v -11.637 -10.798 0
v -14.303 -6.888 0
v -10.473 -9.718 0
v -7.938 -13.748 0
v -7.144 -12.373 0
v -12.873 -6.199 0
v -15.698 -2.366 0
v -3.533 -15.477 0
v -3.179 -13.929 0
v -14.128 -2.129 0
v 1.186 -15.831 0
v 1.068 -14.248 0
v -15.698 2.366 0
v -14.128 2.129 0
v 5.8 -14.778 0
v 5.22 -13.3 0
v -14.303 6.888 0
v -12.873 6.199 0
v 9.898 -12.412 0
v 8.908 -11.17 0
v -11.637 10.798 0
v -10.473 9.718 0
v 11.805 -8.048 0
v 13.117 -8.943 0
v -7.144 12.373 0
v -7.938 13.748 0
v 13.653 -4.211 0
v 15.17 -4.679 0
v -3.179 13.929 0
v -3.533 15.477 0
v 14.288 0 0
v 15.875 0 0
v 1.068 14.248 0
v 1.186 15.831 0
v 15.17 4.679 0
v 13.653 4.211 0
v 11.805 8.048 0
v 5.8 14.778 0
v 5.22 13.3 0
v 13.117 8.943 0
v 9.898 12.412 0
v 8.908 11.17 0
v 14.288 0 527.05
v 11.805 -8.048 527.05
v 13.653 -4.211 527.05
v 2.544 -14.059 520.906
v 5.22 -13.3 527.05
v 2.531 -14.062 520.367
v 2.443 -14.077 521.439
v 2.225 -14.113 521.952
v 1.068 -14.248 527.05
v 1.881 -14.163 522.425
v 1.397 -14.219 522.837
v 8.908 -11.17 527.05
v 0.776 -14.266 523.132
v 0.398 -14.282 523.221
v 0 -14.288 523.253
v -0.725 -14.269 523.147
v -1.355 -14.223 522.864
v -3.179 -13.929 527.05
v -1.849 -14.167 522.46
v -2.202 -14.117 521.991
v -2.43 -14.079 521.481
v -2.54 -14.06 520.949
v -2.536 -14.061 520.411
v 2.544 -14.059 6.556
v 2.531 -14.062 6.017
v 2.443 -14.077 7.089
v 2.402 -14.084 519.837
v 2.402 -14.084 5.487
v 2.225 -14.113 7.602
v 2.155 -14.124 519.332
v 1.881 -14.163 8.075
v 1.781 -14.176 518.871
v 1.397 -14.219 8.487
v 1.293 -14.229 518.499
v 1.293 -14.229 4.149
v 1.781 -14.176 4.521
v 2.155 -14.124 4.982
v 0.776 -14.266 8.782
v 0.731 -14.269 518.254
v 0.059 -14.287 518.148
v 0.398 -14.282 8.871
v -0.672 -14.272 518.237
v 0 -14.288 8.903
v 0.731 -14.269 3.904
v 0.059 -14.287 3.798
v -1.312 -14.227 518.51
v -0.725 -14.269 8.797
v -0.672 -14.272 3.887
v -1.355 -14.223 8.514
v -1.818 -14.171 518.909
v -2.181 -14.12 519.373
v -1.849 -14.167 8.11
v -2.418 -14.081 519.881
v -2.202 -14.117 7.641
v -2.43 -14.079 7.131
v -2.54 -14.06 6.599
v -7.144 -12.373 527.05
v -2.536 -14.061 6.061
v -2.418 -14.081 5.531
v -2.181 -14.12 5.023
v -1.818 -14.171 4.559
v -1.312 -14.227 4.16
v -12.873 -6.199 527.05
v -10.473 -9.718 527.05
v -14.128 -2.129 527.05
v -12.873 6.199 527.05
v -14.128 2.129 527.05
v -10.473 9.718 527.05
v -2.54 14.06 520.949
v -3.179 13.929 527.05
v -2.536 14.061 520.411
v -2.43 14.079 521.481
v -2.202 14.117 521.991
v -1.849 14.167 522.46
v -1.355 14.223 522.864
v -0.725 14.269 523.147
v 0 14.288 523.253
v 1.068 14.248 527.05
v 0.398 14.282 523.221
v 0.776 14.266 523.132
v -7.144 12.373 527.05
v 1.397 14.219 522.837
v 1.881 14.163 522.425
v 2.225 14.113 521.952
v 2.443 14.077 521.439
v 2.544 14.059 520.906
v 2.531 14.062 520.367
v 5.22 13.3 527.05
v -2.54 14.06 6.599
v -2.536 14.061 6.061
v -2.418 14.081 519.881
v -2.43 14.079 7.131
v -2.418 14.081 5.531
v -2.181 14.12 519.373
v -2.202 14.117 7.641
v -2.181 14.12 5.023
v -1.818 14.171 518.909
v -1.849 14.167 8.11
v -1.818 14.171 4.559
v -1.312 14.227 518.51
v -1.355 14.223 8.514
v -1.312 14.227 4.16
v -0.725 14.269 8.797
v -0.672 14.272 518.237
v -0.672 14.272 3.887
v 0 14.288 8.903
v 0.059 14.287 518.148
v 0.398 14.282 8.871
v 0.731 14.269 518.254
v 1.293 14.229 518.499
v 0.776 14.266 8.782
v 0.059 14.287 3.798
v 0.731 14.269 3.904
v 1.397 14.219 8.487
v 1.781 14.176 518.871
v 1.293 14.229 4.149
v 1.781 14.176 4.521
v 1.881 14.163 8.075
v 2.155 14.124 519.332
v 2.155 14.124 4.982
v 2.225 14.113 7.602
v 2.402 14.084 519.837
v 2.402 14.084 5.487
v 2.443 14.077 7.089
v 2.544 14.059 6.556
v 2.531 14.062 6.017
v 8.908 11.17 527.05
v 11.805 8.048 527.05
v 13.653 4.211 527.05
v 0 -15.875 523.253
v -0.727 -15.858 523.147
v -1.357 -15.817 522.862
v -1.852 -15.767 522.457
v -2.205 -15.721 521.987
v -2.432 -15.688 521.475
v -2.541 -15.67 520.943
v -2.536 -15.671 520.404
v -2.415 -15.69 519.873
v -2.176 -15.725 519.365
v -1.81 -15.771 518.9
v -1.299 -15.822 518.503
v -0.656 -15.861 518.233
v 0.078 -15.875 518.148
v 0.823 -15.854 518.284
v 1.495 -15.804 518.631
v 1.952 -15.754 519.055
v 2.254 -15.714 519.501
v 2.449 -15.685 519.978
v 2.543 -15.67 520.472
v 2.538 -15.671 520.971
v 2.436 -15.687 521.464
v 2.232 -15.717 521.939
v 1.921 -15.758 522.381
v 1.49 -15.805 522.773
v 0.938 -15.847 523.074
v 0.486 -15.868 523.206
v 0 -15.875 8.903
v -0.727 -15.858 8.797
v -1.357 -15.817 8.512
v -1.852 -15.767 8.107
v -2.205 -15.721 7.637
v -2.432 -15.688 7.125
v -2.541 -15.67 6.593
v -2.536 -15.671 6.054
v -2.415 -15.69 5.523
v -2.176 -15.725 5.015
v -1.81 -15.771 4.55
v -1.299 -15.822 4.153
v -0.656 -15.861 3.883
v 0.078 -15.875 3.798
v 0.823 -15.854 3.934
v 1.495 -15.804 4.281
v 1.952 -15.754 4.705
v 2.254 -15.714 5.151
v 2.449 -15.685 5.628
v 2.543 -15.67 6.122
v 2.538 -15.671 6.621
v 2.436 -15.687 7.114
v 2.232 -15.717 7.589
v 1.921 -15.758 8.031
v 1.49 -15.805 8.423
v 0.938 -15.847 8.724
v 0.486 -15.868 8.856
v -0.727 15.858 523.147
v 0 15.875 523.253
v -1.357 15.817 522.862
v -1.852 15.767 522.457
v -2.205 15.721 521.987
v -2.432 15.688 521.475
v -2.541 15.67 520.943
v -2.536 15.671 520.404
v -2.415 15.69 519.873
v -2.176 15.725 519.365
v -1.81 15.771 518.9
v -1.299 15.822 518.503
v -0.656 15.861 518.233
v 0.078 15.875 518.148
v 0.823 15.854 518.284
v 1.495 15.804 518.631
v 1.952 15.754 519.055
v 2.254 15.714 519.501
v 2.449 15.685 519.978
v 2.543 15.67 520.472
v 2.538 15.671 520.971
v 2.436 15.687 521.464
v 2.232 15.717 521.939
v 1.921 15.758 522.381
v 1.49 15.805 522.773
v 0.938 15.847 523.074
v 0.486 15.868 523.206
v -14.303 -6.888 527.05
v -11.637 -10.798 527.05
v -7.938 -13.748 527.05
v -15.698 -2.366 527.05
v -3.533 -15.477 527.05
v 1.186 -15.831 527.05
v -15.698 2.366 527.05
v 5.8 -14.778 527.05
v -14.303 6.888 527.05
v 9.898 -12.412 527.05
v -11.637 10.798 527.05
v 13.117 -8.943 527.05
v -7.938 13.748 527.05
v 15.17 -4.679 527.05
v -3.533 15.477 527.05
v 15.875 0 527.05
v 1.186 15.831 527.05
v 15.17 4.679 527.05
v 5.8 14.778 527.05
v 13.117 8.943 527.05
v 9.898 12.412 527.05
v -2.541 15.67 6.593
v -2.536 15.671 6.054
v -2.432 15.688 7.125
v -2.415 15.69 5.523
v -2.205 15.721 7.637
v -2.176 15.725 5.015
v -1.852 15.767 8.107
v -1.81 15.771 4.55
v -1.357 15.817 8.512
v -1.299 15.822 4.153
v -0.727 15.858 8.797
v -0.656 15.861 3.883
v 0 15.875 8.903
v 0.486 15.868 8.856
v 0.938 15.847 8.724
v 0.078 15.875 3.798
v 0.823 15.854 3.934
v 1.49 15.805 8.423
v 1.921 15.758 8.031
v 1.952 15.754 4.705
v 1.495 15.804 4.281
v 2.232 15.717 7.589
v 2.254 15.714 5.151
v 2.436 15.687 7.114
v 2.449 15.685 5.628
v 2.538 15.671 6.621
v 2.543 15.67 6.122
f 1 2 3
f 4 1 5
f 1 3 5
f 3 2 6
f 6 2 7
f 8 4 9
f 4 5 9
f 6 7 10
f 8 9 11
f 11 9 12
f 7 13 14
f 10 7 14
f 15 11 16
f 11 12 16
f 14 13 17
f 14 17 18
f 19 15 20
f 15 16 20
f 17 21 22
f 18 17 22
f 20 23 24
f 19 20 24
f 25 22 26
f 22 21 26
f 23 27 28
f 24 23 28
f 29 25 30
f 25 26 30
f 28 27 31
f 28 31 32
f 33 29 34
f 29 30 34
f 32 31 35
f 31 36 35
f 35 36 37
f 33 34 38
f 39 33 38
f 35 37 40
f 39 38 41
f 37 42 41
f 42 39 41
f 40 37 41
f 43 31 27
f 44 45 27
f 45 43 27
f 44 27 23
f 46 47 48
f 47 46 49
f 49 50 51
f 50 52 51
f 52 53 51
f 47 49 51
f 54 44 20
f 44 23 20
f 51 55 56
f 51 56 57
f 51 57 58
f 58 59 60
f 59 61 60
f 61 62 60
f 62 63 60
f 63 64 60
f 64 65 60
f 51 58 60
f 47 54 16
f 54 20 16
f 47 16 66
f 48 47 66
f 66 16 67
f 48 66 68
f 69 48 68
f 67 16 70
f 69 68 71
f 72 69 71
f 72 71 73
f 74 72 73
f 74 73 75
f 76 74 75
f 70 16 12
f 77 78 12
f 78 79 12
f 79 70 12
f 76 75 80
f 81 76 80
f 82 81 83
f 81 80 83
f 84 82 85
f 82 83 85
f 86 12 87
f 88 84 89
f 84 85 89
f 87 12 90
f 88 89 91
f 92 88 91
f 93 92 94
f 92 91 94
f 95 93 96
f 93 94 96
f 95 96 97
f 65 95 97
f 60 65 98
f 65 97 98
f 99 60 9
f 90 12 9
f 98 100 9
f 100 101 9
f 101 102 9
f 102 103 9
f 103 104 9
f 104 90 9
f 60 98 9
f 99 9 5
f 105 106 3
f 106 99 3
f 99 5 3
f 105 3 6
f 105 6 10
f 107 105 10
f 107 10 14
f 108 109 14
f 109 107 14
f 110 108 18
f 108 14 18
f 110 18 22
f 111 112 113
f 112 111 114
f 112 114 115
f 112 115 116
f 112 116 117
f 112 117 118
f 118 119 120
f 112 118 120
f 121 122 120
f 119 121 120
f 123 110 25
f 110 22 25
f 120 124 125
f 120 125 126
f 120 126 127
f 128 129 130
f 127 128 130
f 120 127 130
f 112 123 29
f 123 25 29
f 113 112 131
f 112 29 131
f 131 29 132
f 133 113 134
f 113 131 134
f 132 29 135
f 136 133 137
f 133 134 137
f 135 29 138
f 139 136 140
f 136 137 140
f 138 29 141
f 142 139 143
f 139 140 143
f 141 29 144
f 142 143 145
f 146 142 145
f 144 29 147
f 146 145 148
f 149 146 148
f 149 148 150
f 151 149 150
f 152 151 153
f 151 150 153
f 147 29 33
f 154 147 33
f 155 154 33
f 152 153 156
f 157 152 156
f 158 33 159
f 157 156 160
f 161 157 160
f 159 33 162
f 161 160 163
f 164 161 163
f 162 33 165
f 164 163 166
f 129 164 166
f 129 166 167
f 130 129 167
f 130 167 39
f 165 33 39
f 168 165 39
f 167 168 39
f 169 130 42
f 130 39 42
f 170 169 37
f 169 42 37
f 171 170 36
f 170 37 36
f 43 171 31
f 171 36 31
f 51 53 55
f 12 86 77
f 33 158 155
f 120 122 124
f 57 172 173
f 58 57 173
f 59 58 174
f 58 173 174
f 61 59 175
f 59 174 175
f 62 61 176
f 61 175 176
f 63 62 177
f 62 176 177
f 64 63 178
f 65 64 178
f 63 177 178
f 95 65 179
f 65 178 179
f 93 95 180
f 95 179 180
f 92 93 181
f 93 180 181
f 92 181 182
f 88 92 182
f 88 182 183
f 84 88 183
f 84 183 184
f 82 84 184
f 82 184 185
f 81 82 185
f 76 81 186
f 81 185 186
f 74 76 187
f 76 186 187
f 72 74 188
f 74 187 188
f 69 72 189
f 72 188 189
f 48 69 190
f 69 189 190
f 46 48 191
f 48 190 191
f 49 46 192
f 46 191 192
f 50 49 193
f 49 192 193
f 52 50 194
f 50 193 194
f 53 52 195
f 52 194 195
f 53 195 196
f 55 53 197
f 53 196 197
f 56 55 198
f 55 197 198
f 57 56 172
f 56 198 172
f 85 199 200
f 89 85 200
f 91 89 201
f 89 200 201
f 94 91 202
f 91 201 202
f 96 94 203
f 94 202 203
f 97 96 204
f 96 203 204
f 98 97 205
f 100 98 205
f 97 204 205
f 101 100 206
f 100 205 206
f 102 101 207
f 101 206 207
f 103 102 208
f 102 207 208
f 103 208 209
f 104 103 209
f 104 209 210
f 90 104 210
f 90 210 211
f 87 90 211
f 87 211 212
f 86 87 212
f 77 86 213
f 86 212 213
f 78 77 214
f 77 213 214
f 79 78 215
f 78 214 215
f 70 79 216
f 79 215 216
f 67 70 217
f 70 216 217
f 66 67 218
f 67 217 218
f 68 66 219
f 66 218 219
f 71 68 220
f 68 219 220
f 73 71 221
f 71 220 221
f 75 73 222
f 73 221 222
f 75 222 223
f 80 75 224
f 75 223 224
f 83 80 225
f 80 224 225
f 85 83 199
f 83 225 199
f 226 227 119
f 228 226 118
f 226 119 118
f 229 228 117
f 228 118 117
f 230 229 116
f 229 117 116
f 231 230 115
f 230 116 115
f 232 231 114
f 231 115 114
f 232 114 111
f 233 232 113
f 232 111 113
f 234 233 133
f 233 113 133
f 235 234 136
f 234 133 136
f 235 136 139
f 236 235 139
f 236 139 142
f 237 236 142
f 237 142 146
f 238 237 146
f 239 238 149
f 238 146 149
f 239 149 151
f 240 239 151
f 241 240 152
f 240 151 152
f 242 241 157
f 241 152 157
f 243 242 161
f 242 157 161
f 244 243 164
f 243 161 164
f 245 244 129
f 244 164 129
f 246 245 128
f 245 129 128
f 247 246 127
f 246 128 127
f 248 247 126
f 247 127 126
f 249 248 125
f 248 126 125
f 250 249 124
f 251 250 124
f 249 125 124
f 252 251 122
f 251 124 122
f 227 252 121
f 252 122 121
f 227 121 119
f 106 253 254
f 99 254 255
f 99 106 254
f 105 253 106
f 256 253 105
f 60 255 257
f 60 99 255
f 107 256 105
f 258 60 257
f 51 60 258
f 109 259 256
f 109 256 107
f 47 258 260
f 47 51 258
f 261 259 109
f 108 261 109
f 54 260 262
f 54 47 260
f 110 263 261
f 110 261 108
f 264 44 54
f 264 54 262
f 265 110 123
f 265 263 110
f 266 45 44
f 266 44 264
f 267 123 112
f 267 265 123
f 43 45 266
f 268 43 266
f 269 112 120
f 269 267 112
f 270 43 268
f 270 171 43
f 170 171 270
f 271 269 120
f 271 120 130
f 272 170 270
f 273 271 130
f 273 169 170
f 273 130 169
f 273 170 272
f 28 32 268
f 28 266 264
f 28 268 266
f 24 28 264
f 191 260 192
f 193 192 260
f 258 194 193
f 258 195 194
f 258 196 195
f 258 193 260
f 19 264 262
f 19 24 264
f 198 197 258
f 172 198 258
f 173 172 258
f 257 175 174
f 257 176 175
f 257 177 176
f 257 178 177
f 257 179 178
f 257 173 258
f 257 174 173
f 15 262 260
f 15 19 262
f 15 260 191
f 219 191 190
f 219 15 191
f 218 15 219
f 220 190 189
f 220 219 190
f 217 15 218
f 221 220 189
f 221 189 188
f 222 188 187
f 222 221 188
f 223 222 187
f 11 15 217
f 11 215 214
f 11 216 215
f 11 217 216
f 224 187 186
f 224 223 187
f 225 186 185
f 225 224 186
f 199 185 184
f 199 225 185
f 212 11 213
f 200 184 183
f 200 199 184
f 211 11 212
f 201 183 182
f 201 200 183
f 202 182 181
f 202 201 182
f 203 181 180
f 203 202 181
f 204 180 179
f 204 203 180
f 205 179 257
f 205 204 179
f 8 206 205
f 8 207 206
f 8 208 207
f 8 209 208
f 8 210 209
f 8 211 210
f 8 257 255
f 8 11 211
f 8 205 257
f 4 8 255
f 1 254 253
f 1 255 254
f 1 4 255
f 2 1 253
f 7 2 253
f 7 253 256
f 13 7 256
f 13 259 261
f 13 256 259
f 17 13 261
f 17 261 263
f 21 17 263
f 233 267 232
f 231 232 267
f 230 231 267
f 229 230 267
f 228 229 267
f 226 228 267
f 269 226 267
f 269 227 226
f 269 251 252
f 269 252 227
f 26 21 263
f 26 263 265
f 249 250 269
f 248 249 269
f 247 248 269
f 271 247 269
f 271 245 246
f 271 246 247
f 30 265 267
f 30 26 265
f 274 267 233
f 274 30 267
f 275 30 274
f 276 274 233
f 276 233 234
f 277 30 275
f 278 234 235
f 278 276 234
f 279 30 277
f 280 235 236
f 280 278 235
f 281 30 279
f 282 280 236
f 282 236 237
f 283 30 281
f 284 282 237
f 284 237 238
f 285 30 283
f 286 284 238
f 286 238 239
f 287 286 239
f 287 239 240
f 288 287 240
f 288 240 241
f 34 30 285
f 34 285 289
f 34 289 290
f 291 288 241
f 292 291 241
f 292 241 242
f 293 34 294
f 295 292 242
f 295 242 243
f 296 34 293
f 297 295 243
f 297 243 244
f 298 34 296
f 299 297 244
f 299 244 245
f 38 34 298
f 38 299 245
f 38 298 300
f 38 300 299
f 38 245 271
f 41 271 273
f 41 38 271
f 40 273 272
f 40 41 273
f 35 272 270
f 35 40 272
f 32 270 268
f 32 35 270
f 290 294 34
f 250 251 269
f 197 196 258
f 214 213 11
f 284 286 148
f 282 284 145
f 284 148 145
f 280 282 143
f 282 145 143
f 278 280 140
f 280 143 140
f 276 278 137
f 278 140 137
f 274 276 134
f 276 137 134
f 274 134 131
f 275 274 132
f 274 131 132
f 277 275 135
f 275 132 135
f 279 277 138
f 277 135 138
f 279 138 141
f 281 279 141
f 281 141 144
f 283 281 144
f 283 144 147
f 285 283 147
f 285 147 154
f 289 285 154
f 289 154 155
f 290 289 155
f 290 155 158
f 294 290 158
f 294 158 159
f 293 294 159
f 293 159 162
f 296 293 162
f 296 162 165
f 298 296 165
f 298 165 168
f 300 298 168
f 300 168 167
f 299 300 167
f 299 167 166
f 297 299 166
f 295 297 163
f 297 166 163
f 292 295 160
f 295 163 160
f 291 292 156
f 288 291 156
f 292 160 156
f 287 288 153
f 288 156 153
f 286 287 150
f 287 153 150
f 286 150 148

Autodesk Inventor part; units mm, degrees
ref_plane "YZ Plane" through (0, 0, 0) normal (1, 0, 0) x (0, 1, 0)
ref_plane "XY Plane" through (0, 0, 0) normal (0, 0, 1) x (1, 0, 0)
sketch "Sketch1" plane through (0, 0, 0) normal (0, 0, 1) x (1, 0, 0)
  circle A0 centre (0, 0) radius 14.2875
  circle A1 centre (0, 0) radius 15.875
  dimension "d0" = 28.575
  dimension "d1" = 31.75
extrude "Extrusion1" add sketch "Sketch1" along normal blind 527.05
ref_plane "Work Plane1" through (0, 25.4, 0) normal (0, 1, 0) x (-1, 0, 0)
sketch "Sketch2" plane through (0, 25.4, 0) normal (0, 1, 0) x (-1, 0, 0)
  line L0 (15.875, 527.05) -> (-15.875, 527.05) projected
  line L1 (-15.875, 0) -> (15.875, 0) projected
  point P0 (0, 0)
  point P1 (0, 6.35)
  point P2 (0, 520.7)
  point P3 (0, 0)
  point P4 (0, 527.05)
  dimension "d5" = 6.35
  dimension "d6" = 6.35
hole "Hole1" at (0, 25.4, 6.35) at (0, 25.4, 520.7) direction (0, -1, 0) diameter 5.1054 end through all
properties part number "ARM_081_BottomRollerTube" material "Aluminum 6061"
